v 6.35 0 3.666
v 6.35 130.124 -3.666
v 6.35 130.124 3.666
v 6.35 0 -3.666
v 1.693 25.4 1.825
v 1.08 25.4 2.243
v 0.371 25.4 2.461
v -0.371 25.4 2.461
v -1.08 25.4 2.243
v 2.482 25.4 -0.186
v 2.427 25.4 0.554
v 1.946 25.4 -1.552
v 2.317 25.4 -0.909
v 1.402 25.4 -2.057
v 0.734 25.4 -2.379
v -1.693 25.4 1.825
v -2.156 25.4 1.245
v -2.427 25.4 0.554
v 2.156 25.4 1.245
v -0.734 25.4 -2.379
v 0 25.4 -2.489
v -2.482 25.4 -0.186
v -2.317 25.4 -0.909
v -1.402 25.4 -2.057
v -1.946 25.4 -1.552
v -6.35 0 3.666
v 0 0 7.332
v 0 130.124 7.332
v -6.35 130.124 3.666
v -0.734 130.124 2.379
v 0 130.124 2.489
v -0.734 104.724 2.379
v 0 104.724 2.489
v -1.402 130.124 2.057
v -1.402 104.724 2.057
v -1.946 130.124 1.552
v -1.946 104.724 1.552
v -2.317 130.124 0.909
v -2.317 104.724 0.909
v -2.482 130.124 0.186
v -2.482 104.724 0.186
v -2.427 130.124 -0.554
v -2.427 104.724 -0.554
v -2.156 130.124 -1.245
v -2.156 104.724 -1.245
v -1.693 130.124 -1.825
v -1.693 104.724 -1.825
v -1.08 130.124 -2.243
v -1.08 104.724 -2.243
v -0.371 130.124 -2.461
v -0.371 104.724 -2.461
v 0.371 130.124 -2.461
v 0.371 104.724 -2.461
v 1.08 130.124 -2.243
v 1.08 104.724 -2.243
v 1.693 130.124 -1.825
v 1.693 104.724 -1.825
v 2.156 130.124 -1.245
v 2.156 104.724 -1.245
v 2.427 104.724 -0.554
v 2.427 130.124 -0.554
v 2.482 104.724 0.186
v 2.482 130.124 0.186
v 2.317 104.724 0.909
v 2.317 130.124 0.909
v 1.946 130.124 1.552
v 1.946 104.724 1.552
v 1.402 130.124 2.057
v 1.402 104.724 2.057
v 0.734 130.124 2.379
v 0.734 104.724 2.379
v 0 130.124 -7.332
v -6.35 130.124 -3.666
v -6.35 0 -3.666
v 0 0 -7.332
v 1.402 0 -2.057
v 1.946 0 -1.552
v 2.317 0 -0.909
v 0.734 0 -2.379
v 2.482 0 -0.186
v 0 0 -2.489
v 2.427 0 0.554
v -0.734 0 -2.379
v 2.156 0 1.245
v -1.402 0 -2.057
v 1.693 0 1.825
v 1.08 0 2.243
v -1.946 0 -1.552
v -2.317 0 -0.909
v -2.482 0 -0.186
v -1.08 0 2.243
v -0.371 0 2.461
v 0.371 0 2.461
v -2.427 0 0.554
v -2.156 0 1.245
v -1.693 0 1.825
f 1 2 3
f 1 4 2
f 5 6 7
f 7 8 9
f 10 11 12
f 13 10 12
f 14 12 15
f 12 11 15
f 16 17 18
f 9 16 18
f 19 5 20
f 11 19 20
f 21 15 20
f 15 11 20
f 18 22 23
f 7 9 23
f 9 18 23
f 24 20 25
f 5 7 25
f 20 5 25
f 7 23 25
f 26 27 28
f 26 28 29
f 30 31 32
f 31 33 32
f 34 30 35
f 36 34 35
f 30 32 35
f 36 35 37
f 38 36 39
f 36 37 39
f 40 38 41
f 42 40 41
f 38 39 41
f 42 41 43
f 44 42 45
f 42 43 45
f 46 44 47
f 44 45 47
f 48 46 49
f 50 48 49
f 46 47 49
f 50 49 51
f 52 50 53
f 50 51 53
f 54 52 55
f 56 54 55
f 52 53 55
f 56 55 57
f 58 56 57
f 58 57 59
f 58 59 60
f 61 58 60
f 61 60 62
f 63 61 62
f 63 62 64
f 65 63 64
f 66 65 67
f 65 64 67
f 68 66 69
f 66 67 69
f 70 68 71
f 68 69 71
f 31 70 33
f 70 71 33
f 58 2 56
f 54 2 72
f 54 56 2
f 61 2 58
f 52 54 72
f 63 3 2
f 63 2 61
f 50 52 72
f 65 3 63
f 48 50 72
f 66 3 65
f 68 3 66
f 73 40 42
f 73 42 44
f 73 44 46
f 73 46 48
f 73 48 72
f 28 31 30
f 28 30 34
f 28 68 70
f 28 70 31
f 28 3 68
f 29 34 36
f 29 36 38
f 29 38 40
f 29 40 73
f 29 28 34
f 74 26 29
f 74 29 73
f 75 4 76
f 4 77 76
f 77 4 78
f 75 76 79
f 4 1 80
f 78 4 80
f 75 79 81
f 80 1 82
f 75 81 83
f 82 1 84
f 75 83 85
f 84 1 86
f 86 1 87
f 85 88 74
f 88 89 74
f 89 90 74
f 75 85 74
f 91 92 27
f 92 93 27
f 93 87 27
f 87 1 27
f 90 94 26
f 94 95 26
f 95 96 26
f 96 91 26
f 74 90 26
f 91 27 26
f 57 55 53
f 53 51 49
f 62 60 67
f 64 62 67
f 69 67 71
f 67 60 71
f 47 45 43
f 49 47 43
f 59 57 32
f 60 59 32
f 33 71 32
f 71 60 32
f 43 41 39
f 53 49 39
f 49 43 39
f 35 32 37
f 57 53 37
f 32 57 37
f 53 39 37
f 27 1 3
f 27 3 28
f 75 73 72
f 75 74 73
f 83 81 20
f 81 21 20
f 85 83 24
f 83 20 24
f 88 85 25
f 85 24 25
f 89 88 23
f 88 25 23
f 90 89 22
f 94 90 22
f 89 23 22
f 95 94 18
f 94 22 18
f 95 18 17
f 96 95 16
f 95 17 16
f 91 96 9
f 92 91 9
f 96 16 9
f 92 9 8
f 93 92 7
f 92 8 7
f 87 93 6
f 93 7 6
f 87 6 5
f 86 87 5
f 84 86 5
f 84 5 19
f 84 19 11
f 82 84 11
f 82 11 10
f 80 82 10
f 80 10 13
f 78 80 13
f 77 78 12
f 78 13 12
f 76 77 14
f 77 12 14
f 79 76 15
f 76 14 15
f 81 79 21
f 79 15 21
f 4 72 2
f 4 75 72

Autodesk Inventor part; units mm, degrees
ref_plane "YZ Plane" through (0, 0, 0) normal (1, 0, 0) x (0, 1, 0)
ref_plane "XZ Plane" through (0, 0, 0) normal (0, 1, 0) x (-1, 0, 0)
ref_plane "XY Plane" through (0, 0, 0) normal (0, 0, 1) x (1, 0, 0)
sketch "Sketch1" plane through (0, 0, 0) normal (0, 1, 0) x (-1, 0, 0)
  line L0 (6.35, -3.6662) -> (0, -7.3323)
  line L1 (0, -7.3323) -> (-6.35, -3.6662)
  line L2 (-6.35, -3.6662) -> (-6.35, 3.6662)
  line L3 (-6.35, 3.6662) -> (0, 7.3323)
  line L4 (0, 7.3323) -> (6.35, 3.6662)
  line L5 (6.35, 3.6662) -> (6.35, -3.6662)
  point P0 (0, 0)
  point P1 (0, 0)
  point P2 (0, 0)
  dimension "d0" = 12.7
extrude "Extrusion1" add sketch "Sketch1" along normal blind 130.1242
sketch "Sketch2" plane through (0, 0, 0) normal (0, -1, 0) x (1, 0, 0)
  point P0 (0, 0)
  point P1 (0, 0)
hole "Hole1" at (0, 0, 0) direction (0, 1, 0) diameter 4.9784 depth 25.4 thread size "1/4-20 UNC" class "2B" standard "ANSI Unified Screw Threads"
sketch "Sketch3" plane through (0, 130.1242, 0) normal (0, 1, 0) x (1, 0, 0)
  point P0 (0, 0)
  point P1 (0, 0)
hole "Hole2" at (0, 130.1242, 0) direction (0, -1, 0) diameter 4.9784 depth 25.4 thread size "1/4-20 UNC" class "2B" standard "ANSI Unified Screw Threads"
properties part number "SHOT_1_006_HexShaft1" material "Aluminum 6061"
